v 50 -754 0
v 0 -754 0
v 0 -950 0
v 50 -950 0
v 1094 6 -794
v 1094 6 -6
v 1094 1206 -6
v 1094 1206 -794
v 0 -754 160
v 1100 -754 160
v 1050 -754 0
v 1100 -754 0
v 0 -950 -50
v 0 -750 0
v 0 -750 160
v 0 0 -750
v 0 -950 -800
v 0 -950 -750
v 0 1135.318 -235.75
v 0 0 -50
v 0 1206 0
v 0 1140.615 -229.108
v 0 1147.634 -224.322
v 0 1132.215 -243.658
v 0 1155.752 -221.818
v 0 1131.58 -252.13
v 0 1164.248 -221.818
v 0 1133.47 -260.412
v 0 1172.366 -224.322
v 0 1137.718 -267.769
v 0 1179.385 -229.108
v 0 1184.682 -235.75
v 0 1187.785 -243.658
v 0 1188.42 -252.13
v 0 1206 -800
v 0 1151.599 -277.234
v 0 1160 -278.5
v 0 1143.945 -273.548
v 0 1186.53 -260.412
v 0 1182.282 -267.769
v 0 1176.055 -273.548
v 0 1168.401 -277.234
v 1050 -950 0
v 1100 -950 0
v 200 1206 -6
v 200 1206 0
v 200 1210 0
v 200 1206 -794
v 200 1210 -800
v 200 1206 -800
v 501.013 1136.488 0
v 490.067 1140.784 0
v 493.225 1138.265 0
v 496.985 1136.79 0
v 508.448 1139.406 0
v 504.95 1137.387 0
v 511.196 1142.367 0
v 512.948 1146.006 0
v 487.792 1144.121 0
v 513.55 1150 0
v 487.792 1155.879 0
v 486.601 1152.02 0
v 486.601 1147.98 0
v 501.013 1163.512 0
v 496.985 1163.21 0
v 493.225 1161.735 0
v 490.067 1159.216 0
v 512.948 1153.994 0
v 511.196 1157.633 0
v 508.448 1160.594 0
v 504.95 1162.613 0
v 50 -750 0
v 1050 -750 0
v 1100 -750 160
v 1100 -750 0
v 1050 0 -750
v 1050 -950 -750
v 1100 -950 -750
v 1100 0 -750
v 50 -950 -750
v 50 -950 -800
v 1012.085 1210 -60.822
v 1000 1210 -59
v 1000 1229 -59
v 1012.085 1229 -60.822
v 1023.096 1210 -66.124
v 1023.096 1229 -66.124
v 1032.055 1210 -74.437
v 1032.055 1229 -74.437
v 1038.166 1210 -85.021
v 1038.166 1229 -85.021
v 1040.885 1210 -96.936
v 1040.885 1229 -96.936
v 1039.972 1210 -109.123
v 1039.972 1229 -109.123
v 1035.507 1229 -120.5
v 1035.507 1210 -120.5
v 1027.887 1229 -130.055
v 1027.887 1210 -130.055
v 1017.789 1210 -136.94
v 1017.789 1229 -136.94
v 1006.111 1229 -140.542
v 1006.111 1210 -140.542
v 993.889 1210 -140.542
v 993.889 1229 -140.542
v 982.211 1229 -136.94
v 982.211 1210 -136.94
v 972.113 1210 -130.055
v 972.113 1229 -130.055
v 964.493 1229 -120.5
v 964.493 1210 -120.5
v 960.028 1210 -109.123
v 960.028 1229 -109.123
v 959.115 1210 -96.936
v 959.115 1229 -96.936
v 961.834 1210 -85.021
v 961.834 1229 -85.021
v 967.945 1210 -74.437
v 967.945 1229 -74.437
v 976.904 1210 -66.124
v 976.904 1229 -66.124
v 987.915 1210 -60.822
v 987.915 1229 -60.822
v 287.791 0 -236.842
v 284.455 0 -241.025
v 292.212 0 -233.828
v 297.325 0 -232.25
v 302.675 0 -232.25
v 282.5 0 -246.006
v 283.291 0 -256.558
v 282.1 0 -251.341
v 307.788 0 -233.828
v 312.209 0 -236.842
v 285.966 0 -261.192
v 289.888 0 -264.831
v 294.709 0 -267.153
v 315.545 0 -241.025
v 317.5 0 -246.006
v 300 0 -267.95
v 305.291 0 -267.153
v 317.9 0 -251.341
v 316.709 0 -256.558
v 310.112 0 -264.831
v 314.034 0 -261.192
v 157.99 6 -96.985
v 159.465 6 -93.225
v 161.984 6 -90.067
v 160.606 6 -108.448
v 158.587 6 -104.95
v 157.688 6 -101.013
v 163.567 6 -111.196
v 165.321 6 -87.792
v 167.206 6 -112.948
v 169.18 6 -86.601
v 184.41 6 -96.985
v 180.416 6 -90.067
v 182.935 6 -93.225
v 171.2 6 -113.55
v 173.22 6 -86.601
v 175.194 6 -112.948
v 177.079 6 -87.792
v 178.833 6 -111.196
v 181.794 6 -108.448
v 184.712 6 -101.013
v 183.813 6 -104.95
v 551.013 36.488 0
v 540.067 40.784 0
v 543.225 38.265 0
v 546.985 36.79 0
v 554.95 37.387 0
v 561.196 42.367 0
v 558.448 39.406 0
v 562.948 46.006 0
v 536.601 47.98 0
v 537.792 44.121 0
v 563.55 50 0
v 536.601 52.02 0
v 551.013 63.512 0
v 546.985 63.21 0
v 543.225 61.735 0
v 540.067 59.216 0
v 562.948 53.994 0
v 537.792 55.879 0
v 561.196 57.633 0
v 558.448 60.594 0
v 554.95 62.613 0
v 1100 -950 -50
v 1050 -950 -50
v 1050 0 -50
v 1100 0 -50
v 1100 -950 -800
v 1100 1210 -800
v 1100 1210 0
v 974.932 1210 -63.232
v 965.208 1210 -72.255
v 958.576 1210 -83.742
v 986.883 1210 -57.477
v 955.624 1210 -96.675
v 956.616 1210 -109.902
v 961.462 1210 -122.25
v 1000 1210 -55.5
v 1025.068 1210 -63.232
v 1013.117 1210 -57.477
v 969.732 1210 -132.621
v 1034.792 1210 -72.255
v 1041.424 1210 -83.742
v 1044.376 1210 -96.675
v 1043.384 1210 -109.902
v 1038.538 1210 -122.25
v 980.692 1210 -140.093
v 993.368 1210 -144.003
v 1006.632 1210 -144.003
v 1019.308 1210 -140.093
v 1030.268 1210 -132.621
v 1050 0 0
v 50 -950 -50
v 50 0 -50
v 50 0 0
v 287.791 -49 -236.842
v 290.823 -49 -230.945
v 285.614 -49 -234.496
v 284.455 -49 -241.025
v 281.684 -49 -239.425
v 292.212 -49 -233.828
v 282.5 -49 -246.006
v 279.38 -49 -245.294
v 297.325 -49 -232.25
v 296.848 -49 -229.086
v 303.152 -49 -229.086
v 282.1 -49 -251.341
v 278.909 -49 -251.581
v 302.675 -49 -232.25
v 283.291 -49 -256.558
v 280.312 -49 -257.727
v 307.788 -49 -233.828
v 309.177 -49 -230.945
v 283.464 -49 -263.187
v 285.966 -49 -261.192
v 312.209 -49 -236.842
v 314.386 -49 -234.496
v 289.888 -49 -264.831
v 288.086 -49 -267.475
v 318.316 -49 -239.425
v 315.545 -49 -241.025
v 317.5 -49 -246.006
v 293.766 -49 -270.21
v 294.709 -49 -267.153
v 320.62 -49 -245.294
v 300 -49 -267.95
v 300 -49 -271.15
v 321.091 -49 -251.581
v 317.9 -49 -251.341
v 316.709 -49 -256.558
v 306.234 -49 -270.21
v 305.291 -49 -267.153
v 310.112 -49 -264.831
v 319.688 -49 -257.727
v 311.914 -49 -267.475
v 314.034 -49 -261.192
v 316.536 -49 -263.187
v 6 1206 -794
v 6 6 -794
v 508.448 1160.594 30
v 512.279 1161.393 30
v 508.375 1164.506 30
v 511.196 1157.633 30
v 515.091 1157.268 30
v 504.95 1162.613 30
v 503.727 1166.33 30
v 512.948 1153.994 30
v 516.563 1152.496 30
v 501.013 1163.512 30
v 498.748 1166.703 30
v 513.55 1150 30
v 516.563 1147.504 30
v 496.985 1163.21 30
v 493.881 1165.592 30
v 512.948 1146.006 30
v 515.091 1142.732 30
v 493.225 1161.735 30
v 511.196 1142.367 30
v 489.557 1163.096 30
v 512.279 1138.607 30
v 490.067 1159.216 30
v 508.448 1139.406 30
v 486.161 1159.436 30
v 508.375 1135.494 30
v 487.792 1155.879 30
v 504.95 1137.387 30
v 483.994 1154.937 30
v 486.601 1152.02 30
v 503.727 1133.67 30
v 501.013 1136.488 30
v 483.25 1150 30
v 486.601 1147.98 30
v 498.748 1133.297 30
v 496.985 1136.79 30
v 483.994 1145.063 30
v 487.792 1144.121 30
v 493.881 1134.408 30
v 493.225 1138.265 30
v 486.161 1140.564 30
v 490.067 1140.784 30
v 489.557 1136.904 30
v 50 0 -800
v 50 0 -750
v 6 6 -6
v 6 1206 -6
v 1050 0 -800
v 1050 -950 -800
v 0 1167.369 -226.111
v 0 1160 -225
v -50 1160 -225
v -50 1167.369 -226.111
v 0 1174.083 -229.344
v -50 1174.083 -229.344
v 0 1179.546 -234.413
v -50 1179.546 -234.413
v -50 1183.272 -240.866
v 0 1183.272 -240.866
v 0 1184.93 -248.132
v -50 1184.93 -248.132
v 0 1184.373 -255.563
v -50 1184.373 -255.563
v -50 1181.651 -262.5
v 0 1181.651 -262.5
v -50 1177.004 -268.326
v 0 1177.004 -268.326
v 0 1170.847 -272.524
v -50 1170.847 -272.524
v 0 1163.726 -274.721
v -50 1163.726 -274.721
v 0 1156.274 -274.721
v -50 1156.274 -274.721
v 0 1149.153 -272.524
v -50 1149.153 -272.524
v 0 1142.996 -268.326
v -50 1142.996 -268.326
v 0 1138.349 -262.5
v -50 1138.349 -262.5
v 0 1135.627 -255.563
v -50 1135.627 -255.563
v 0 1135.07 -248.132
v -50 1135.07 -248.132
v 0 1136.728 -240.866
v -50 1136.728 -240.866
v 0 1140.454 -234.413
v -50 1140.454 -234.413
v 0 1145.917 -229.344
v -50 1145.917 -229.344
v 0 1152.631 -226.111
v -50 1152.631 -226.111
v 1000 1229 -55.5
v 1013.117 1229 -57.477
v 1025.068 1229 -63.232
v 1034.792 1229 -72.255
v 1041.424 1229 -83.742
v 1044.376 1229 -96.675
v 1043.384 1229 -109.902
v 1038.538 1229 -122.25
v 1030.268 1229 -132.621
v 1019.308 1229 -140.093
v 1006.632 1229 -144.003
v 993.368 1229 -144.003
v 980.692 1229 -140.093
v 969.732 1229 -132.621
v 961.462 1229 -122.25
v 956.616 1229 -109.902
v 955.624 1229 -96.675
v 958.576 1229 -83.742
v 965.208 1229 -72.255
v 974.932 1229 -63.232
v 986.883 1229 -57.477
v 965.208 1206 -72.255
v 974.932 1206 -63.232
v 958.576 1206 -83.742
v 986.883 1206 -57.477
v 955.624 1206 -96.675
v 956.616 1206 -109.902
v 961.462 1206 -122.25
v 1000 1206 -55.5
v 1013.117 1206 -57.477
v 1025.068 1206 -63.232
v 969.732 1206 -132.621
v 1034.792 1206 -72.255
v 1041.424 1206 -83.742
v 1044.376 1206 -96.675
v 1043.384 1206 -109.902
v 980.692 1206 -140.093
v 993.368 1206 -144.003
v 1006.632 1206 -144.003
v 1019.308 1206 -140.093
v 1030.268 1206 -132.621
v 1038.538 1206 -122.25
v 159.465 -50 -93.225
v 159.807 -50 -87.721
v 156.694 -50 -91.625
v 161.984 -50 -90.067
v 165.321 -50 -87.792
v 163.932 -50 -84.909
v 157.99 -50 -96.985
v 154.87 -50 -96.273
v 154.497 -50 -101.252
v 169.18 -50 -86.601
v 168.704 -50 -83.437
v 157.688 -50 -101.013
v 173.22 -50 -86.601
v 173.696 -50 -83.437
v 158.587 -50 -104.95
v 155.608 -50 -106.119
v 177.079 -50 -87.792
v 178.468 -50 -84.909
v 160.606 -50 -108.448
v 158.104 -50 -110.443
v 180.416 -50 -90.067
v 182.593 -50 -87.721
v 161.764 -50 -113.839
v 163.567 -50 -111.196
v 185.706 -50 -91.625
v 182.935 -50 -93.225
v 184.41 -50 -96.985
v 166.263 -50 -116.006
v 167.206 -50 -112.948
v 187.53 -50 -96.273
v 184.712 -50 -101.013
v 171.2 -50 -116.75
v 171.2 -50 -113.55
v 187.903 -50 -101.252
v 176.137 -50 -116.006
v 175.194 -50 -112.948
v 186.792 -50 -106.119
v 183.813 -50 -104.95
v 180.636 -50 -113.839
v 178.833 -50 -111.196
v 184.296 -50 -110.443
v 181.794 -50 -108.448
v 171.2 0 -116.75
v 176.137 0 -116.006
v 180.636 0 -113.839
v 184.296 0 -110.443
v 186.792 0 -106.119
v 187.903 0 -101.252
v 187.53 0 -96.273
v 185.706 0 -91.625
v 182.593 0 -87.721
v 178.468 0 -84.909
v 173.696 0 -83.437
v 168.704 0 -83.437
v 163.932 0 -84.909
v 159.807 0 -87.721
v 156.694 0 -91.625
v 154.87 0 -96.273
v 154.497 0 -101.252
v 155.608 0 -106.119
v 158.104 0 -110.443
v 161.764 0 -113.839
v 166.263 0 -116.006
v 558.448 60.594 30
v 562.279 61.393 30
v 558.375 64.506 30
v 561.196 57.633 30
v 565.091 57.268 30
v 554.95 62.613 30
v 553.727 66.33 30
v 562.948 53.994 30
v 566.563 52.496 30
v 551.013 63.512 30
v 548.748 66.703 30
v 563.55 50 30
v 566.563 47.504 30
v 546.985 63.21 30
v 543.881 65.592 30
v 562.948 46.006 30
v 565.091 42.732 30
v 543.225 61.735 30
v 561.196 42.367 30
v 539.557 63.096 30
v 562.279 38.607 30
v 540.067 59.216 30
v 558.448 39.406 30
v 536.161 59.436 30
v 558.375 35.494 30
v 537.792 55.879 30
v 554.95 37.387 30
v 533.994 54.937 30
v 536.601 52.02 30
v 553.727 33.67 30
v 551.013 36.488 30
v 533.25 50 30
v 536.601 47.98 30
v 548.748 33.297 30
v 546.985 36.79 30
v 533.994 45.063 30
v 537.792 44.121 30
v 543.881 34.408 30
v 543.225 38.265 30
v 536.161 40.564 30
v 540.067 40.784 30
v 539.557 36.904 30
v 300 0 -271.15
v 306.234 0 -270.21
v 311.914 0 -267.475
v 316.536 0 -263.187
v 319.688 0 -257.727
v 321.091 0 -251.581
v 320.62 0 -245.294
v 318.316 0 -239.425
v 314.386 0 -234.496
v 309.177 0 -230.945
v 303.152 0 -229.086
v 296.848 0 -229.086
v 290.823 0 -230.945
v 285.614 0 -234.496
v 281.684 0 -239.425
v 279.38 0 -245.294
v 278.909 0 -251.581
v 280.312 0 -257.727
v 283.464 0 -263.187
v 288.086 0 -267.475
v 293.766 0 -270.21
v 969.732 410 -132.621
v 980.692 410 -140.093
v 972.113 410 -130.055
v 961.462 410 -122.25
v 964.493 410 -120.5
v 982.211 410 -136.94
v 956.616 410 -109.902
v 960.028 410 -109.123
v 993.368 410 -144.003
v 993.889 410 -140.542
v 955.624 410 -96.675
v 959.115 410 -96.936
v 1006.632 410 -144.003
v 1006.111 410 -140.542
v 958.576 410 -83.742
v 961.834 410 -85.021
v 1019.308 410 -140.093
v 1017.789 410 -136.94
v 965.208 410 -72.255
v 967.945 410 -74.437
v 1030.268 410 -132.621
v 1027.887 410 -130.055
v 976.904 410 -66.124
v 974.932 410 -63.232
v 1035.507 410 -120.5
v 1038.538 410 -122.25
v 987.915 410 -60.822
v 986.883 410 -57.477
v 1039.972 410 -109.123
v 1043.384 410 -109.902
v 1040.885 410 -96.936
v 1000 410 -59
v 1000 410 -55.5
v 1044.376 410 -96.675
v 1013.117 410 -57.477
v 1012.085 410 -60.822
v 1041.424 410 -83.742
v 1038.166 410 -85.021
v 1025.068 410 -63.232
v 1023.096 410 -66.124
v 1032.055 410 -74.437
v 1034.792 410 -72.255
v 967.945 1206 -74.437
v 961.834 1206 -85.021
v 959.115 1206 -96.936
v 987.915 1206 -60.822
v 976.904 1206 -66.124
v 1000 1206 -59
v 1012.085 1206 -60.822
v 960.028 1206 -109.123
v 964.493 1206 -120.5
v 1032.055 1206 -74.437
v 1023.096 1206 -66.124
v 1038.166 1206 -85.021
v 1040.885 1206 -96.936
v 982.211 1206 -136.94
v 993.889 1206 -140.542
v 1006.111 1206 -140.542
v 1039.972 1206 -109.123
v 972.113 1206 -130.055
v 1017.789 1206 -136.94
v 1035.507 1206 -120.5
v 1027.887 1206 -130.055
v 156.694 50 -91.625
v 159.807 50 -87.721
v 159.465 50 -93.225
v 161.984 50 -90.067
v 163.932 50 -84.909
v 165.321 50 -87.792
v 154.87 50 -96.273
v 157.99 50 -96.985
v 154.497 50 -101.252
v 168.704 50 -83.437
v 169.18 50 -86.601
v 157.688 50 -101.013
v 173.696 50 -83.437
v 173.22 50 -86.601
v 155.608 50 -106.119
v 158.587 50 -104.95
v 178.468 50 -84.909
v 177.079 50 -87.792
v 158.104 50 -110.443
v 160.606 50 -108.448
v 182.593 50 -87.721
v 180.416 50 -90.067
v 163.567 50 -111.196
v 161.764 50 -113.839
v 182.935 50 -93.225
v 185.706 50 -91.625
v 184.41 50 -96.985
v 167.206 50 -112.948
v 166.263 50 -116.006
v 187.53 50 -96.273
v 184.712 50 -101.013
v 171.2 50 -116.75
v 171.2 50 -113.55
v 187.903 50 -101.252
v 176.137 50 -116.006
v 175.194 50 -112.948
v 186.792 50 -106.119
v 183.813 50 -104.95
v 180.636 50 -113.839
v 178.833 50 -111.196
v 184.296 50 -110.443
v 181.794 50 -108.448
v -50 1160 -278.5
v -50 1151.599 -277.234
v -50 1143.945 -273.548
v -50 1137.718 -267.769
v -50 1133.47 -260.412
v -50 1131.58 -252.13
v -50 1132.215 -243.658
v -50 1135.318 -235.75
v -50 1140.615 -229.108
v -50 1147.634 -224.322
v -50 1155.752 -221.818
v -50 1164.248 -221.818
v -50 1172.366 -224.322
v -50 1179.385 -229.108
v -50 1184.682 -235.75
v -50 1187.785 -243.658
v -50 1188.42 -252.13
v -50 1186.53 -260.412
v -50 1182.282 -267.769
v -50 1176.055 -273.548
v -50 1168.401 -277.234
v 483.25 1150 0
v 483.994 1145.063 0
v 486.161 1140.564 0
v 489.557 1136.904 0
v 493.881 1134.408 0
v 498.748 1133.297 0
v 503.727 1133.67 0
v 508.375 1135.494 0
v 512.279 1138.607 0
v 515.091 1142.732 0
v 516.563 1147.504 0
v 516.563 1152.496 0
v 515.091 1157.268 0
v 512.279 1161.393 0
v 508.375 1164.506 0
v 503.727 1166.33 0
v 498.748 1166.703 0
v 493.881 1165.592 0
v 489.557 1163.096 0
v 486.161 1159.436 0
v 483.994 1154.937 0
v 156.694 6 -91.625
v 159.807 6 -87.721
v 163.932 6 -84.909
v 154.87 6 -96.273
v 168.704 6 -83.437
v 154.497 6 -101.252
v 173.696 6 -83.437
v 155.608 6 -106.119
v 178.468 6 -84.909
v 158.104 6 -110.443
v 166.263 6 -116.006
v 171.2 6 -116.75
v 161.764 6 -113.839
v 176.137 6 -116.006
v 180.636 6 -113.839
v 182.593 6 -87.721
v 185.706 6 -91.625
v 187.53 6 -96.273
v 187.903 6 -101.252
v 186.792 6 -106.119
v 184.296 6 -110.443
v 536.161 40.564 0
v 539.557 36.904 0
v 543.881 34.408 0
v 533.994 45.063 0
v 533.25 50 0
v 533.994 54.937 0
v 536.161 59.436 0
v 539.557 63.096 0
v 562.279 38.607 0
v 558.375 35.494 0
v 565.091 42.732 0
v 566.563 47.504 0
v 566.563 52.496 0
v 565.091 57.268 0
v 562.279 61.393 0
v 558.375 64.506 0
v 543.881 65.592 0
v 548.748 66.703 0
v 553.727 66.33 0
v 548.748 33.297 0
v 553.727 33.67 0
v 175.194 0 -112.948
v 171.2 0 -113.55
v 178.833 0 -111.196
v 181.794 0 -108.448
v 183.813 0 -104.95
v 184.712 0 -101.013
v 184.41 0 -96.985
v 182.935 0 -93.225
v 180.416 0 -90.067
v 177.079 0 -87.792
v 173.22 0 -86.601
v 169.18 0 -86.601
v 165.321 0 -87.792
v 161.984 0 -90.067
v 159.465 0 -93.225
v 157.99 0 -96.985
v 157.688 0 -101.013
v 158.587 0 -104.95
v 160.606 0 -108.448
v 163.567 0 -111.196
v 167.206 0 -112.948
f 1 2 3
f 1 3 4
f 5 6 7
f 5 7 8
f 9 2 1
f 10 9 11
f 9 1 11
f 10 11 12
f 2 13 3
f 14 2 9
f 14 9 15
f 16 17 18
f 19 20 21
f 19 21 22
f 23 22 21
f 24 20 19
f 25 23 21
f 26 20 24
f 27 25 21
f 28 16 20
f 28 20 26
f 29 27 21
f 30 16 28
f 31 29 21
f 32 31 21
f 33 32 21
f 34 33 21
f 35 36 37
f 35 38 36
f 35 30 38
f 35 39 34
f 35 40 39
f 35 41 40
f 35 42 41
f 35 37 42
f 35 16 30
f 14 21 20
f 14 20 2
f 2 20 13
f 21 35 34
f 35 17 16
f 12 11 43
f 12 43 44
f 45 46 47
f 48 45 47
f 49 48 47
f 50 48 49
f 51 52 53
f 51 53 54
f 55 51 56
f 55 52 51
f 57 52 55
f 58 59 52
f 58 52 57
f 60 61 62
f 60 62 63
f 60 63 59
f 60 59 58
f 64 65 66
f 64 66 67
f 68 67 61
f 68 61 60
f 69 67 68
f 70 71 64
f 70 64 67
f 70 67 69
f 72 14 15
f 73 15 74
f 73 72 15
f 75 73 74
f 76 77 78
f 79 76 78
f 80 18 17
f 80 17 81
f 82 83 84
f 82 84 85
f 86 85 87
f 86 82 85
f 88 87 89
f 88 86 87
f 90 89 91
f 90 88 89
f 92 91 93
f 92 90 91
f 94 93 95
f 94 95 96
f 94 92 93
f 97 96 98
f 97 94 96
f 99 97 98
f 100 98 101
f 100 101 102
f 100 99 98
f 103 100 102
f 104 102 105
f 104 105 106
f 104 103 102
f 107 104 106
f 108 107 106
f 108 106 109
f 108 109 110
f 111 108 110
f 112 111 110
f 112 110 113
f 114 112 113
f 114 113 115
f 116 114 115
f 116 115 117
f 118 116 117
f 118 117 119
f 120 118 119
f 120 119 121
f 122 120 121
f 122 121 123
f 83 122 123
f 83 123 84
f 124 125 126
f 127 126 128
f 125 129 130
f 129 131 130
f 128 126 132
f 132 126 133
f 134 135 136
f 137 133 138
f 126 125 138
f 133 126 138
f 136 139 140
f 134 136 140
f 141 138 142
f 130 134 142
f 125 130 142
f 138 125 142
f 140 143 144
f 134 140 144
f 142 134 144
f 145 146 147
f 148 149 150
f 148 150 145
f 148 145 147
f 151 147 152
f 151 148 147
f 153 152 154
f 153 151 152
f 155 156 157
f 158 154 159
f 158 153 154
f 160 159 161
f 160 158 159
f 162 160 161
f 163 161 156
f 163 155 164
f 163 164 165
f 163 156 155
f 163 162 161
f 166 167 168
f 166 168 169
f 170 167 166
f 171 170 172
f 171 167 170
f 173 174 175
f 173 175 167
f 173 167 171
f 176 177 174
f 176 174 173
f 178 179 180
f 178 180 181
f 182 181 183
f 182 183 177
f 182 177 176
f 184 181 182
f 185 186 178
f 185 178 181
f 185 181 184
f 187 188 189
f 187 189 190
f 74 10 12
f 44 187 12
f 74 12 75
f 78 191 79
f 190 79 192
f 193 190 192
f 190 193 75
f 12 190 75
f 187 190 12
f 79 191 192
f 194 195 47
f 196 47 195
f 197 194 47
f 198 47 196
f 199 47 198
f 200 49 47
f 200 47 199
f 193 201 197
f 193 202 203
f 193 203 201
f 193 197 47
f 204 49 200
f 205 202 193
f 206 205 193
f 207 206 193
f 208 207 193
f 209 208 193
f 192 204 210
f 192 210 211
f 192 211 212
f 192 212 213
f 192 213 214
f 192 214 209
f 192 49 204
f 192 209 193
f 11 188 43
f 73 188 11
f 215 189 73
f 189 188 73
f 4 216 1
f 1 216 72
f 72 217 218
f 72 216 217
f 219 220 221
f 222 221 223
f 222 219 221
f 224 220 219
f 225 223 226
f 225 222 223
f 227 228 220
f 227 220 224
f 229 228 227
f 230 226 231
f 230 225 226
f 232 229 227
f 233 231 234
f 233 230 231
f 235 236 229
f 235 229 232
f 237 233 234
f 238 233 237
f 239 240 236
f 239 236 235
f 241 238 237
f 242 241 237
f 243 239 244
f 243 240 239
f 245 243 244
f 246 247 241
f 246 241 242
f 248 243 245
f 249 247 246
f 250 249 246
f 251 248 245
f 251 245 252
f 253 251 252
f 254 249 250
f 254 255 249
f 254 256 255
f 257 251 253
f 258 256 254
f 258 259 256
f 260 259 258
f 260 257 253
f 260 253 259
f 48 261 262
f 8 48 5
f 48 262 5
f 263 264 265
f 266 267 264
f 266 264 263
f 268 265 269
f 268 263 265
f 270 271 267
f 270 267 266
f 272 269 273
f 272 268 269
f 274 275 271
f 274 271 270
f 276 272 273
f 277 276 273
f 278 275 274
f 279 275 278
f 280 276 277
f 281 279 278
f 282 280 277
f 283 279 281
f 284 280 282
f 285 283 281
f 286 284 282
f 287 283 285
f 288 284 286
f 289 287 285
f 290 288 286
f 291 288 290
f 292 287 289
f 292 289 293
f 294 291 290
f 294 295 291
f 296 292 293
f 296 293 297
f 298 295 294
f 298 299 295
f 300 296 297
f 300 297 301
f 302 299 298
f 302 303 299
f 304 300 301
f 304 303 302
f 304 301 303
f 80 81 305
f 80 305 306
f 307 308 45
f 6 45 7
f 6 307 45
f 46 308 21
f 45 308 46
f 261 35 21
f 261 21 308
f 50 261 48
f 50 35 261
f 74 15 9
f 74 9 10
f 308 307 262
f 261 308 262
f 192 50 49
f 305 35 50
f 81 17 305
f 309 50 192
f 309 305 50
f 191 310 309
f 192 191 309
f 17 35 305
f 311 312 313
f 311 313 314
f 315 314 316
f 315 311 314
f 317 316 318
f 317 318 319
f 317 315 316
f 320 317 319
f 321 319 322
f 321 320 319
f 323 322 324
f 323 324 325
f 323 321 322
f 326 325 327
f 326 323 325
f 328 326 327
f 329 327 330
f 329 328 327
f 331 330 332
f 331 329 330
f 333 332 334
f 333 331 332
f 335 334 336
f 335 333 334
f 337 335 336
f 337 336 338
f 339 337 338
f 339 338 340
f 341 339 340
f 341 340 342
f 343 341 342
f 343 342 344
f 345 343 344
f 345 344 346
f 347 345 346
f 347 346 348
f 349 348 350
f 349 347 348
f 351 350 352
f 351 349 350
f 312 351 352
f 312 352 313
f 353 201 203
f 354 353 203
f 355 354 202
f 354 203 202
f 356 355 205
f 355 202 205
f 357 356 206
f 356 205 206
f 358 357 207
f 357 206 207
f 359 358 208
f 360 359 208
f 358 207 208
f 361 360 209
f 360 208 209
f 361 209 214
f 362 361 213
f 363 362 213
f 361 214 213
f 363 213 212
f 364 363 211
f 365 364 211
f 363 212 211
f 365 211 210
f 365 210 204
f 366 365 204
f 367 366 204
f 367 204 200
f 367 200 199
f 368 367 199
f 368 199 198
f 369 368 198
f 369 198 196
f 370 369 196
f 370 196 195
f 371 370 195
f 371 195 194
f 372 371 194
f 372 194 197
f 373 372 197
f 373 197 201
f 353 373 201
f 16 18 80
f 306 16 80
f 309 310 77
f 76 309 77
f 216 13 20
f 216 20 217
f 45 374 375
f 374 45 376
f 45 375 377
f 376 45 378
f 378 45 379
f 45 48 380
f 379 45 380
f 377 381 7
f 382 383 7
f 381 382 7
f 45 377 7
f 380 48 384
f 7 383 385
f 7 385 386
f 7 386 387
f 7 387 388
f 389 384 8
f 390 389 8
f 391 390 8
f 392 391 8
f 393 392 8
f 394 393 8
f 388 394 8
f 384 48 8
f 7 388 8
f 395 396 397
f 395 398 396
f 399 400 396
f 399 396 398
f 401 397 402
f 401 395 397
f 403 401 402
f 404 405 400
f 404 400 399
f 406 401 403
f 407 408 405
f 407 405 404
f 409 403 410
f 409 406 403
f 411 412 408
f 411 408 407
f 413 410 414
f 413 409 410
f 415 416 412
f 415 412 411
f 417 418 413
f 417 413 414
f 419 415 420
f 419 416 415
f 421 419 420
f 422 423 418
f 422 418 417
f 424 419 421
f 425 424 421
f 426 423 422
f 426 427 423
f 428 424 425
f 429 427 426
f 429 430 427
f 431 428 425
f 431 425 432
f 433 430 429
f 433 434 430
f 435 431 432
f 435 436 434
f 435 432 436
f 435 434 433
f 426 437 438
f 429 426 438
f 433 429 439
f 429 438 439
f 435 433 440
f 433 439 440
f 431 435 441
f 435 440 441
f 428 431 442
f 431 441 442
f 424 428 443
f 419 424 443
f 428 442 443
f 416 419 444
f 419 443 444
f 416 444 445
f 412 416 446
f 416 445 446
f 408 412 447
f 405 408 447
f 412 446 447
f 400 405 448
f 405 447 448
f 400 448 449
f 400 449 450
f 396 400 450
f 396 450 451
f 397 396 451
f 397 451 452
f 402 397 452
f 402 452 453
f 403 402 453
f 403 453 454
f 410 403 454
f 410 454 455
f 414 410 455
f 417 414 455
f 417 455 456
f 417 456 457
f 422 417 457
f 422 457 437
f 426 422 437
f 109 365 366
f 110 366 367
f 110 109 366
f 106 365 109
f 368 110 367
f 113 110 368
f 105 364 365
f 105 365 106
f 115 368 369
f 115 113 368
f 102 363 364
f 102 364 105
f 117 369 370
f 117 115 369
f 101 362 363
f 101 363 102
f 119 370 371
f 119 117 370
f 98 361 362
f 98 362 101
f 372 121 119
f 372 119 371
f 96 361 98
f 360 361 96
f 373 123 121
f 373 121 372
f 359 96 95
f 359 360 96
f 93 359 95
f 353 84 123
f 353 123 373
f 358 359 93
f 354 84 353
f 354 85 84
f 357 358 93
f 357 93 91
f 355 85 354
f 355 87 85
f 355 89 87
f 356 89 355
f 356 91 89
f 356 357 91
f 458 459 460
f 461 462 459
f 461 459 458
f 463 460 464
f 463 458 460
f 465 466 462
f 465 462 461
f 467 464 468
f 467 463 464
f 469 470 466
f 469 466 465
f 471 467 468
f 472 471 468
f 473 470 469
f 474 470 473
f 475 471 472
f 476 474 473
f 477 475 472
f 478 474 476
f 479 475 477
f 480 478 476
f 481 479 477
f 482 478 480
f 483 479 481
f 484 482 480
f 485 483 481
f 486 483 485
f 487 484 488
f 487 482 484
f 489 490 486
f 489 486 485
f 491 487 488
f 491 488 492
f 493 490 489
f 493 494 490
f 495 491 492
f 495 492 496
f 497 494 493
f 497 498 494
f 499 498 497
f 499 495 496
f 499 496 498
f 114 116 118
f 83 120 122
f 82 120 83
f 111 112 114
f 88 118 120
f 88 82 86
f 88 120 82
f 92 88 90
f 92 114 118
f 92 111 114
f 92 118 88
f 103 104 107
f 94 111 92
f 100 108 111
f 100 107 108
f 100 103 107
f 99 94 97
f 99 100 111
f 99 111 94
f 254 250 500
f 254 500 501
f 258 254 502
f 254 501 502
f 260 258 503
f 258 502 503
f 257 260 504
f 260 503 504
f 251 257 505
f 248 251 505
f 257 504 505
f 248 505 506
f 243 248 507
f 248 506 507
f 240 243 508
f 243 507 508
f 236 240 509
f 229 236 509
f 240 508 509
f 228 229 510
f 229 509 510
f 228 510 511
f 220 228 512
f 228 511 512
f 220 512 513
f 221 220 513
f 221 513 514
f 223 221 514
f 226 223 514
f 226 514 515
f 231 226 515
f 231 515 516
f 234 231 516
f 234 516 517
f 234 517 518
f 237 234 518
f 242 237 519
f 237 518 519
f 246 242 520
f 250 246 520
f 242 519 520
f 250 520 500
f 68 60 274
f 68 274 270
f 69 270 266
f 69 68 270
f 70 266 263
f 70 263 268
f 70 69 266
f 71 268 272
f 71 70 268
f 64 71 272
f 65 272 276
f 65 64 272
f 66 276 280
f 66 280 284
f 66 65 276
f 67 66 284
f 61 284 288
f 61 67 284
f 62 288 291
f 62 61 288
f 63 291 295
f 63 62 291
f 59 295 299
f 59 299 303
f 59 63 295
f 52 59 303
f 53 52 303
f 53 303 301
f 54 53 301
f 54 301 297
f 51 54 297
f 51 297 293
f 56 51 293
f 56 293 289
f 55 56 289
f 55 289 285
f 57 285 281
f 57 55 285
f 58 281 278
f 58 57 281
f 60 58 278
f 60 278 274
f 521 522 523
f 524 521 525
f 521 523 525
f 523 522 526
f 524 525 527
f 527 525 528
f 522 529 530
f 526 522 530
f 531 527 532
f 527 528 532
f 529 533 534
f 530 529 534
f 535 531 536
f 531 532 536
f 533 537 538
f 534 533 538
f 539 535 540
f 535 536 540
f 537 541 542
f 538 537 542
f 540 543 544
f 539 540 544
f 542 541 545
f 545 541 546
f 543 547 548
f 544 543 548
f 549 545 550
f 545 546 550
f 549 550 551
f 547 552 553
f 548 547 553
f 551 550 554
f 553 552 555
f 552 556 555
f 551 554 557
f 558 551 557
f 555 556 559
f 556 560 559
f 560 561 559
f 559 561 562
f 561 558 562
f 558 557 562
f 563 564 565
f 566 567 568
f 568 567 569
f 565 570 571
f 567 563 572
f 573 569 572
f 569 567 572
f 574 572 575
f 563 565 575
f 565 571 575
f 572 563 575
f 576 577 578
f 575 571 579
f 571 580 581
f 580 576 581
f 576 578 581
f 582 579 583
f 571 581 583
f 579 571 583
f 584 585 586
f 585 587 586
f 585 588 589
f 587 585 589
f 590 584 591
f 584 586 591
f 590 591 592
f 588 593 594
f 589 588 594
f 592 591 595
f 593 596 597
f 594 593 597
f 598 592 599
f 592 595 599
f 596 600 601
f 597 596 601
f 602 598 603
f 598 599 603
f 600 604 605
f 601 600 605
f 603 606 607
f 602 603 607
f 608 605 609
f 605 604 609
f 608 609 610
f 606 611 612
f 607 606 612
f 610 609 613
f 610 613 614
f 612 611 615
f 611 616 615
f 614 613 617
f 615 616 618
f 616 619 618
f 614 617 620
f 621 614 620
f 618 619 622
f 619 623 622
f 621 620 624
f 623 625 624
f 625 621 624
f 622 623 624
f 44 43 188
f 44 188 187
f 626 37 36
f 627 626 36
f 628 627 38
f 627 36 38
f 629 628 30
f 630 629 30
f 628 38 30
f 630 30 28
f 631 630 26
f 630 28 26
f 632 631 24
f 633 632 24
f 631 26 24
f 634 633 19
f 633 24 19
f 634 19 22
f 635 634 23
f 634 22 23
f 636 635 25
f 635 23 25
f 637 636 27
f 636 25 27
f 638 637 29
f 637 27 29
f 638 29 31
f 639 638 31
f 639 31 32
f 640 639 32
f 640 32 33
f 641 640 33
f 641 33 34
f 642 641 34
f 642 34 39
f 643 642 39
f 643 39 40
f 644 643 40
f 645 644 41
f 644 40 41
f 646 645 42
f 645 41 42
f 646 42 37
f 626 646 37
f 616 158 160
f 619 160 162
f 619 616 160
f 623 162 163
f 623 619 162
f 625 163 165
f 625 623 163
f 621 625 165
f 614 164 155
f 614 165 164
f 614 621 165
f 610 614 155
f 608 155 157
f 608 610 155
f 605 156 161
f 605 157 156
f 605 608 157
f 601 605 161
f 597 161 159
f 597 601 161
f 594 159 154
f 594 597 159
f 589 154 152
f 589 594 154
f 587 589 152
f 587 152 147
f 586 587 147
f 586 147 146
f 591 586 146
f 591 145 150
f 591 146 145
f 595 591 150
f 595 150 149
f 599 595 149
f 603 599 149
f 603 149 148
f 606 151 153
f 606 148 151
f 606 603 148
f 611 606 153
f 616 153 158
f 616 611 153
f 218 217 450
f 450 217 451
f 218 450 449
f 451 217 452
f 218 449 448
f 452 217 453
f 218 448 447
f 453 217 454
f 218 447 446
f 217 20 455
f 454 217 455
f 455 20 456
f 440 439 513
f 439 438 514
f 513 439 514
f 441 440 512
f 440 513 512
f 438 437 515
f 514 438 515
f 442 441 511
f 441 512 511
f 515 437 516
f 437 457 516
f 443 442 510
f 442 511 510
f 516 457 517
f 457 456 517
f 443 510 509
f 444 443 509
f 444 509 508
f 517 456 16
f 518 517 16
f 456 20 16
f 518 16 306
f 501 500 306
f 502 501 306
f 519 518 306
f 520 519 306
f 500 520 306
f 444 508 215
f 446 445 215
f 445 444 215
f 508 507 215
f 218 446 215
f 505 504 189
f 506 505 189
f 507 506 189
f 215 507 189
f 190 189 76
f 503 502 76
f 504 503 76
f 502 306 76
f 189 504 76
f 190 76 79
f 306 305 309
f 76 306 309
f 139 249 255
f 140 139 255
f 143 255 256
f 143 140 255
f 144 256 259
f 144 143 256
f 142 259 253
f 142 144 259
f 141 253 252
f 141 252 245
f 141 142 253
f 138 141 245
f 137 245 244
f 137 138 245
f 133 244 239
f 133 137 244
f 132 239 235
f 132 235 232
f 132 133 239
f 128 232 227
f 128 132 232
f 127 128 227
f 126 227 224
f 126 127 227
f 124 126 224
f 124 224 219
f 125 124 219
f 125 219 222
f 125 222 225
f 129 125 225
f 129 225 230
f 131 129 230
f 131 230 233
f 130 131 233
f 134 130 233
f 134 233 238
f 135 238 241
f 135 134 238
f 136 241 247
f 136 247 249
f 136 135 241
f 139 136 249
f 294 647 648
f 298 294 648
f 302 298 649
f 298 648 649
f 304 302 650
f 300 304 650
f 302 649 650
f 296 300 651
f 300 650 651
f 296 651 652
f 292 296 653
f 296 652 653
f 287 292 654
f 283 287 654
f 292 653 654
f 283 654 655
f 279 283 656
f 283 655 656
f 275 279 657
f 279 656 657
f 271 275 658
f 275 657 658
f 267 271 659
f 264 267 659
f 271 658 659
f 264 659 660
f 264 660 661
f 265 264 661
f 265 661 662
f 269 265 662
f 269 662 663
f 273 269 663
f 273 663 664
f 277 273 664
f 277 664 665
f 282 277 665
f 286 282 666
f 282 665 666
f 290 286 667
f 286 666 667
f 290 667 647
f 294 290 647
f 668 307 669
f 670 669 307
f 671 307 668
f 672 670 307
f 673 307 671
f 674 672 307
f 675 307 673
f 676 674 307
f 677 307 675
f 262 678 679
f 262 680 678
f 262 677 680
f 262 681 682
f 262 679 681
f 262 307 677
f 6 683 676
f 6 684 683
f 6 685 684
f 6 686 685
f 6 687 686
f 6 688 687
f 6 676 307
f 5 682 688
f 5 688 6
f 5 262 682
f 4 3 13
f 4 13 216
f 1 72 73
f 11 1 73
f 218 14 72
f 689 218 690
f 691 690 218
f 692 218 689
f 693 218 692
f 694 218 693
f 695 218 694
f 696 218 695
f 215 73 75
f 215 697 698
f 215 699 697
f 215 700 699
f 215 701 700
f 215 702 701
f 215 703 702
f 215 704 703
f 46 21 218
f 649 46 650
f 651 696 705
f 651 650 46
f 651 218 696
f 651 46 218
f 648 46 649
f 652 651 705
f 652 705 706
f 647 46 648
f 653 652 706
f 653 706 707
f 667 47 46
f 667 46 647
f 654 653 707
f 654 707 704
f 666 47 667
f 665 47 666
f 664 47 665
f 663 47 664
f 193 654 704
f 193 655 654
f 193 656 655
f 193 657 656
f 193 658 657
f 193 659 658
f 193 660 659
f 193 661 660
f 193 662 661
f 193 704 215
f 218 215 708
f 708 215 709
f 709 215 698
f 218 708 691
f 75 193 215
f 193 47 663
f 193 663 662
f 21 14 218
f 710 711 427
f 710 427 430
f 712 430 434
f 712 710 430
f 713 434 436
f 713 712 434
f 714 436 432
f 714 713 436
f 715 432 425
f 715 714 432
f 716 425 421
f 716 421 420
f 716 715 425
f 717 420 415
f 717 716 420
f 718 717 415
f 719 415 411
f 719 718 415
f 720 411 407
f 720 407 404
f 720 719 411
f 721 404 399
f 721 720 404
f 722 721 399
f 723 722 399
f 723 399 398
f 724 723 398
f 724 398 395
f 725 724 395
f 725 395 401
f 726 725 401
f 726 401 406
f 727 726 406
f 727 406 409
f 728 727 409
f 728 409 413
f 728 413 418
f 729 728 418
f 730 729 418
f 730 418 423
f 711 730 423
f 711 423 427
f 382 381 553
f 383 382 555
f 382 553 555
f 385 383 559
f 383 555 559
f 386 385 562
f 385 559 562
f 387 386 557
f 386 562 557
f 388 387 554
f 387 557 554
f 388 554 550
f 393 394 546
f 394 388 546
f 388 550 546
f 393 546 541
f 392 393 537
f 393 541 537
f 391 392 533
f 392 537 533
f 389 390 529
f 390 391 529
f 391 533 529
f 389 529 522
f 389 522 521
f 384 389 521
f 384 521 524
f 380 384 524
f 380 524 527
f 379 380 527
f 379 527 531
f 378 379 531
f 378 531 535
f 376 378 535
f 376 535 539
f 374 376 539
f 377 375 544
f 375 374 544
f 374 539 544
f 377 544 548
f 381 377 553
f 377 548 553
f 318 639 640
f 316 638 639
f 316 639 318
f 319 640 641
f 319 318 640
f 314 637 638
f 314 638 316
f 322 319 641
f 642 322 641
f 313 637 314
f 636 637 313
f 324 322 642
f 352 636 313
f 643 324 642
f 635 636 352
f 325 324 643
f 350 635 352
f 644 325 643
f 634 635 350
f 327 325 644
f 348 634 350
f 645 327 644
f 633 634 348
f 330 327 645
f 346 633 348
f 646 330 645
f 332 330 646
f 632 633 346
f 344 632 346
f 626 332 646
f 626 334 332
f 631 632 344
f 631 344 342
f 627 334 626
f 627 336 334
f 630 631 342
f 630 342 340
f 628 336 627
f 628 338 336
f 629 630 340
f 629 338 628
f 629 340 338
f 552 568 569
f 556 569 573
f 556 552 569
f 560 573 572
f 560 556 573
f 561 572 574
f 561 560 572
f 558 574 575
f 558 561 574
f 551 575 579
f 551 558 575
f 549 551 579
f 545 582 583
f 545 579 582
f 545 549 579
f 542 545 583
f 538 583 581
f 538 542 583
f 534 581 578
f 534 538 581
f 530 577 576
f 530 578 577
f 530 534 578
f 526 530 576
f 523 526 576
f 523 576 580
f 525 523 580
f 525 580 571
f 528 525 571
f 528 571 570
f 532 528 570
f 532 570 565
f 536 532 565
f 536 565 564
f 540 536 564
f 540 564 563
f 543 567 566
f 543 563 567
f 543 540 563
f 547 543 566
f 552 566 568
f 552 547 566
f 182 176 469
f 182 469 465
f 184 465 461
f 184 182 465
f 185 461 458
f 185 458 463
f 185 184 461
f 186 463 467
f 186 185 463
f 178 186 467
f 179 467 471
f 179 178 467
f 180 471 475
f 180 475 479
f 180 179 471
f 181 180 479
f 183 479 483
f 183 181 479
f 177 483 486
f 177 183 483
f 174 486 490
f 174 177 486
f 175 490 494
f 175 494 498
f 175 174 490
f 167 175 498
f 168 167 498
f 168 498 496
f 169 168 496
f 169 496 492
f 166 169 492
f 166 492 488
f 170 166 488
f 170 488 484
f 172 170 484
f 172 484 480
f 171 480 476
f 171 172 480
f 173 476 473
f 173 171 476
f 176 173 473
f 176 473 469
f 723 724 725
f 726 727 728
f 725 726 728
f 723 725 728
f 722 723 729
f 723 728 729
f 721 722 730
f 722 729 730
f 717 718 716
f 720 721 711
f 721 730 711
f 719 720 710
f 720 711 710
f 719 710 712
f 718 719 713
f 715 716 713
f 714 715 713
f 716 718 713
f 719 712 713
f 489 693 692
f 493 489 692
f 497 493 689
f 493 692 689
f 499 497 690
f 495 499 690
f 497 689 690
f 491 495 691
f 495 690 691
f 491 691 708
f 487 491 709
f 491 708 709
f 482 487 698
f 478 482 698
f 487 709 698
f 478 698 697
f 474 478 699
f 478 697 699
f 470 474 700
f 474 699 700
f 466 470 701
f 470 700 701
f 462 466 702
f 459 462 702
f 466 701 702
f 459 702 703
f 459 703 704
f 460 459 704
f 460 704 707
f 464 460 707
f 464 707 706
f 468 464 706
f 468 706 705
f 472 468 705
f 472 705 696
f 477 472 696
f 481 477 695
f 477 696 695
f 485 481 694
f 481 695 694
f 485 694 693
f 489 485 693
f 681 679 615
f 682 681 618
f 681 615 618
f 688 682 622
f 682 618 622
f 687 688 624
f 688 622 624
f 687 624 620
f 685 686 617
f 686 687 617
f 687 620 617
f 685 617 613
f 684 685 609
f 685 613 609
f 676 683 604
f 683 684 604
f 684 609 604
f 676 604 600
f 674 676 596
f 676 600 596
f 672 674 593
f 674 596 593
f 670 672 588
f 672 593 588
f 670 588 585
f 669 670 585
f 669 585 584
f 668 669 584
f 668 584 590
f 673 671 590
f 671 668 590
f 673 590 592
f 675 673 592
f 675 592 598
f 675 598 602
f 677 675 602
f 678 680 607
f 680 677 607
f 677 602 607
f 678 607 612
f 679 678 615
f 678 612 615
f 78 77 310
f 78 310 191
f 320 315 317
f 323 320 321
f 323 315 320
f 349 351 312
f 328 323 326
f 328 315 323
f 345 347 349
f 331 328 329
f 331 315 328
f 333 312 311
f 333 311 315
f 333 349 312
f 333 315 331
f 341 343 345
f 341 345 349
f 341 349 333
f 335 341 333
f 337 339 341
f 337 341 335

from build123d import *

# Parameters (mm, degrees)
SKETCH_1_W           = 1100
SKETCH_1_H           = 800
EXTRUDE_1_DEPTH      = 6
SKETCH_3_W           = 1100
SKETCH_3_H           = 800
SKETCH_3_W_2         = 1088
SKETCH_3_H_2         = 788
EXTRUDE_2_DEPTH      = 1200
SKETCH_4_W           = 900
SKETCH_4_H           = 800
EXTRUDE_3_DEPTH      = 4
SKETCH_5_W           = 50
SKETCH_5_H           = 50
EXTRUDE_4_DEPTH      = 950
EXTRUDE_5_DEPTH      = 19
EXTRUDE_5_DEPTH_BACK = 800
SKETCH_6_R           = 44.5
SKETCH_6_R_2         = 41
SKETCH_7_R           = 28.5
SKETCH_7_R_2         = 25
EXTRUDE_6_DEPTH      = 50
EXTRUDE_7_DEPTH      = 50
EXTRUDE_7_DEPTH_BACK = 50
SKETCH_8_R           = 16.75
SKETCH_8_R_2         = 13.55
SKETCH_9_R           = 21.15
SKETCH_9_R_2         = 17.95
EXTRUDE_8_DEPTH      = 49
SKETCH_10_R          = 16.75
SKETCH_10_R_2        = 13.55
EXTRUDE_9_DEPTH      = 30
SKETCH_13_W          = 1100
SKETCH_13_H          = 4
EXTRUDE_12_DEPTH     = 160
SKETCH_14_R          = 16.75
SKETCH_14_R_2        = 13.55
EXTRUDE_13_DEPTH     = 30


with BuildPart() as part:
    # Эскиз1 → Бобышка-Вытянуть1 (new body)
    with BuildSketch(Plane(origin=(0, 0, 0), x_dir=(1, 0, 0), z_dir=(0, 1, 0))):
        with Locations((550, 400)):
            Rectangle(SKETCH_1_W, SKETCH_1_H)
    extrude(amount=EXTRUDE_1_DEPTH)

    # Эскиз3 → Бобышка-Вытянуть2 (add)
    with BuildSketch(Plane(origin=(0, 6, 0), x_dir=(1, 0, 0), z_dir=(0, 1, 0))):
        with Locations((550, 400)):
            Rectangle(SKETCH_3_W, SKETCH_3_H)
        with Locations((550, 400)):
            Rectangle(SKETCH_3_W_2, SKETCH_3_H_2, mode=Mode.SUBTRACT)
    extrude(amount=EXTRUDE_2_DEPTH)

    # Эскиз4 → Бобышка-Вытянуть3 (add)
    with BuildSketch(Plane(origin=(0, 1206, 0), x_dir=(1, 0, 0), z_dir=(0, 1, 0))):
        with Locations((650, 400)):
            Rectangle(SKETCH_4_W, SKETCH_4_H)
    extrude(amount=EXTRUDE_3_DEPTH)

    # Эскиз5 → Бобышка-Вытянуть4 (add)
    with BuildSketch(Plane.XZ):
        with Locations((1075, -25)):
            Rectangle(SKETCH_5_W, SKETCH_5_H)
        with Locations((25, -25)):
            Rectangle(SKETCH_5_W, SKETCH_5_H)
        with Locations((1075, -775)):
            Rectangle(SKETCH_5_W, SKETCH_5_H)
        with Locations((25, -775)):
            Rectangle(SKETCH_5_W, SKETCH_5_H)
    extrude(amount=EXTRUDE_4_DEPTH)

    # Эскиз6 → Бобышка-Вытянуть5 (add, two sides: drawn at the far end of the back side and taken through both)
    with BuildSketch(Plane(origin=(0, 1210, 0), x_dir=(1, 0, 0), z_dir=(0, 1, 0)).offset(-EXTRUDE_5_DEPTH_BACK)):
        with Locations(Location((1000, 100, 0), (0, 0, 270))):
            Circle(SKETCH_6_R)
        with Locations(Location((1000, 100, 0), (0, 0, 270))):
            Circle(SKETCH_6_R_2, mode=Mode.SUBTRACT)
    extrude(amount=EXTRUDE_5_DEPTH + EXTRUDE_5_DEPTH_BACK)

    # Эскиз7 → Бобышка-Вытянуть6 (add)
    with BuildSketch(Plane.ZY):
        with Locations(Location((-250, 1160, 0), (0, 0, 180))):
            Circle(SKETCH_7_R)
        with Locations((-250, 1160)):
            Circle(SKETCH_7_R_2, mode=Mode.SUBTRACT)
    extrude(amount=EXTRUDE_6_DEPTH)

    # Эскиз8 → Бобышка-Вытянуть7 (add, two sides: drawn at the far end of the back side and taken through both)
    with BuildSketch(Plane.XZ.offset(-EXTRUDE_7_DEPTH_BACK)):
        with Locations(Location((171.2, -100, 0), (0, 0, 270))):
            Circle(SKETCH_8_R)
        with Locations(Location((171.2, -100, 0), (0, 0, 270))):
            Circle(SKETCH_8_R_2, mode=Mode.SUBTRACT)
    extrude(amount=EXTRUDE_7_DEPTH + EXTRUDE_7_DEPTH_BACK)

    # Эскиз9 → Бобышка-Вытянуть8 (add)
    with BuildSketch(Plane.XZ):
        with Locations(Location((300, -250, 0), (0, 0, 270))):
            Circle(SKETCH_9_R)
        with Locations(Location((300, -250, 0), (0, 0, 270))):
            Circle(SKETCH_9_R_2, mode=Mode.SUBTRACT)
    extrude(amount=EXTRUDE_8_DEPTH)

    # Эскиз10 → Бобышка-Вытянуть9 (add)
    with BuildSketch(Plane.XY):
        with Locations(Location((500, 1150, 0), (0, 0, 180))):
            Circle(SKETCH_10_R)
        with Locations((500, 1150)):
            Circle(SKETCH_10_R_2, mode=Mode.SUBTRACT)
    extrude(amount=EXTRUDE_9_DEPTH)

    # Эскиз13 → Бобышка-Вытянуть12 (add)
    with BuildSketch(Plane.XY):
        with Locations((550, -752)):
            Rectangle(SKETCH_13_W, SKETCH_13_H)
    extrude(amount=EXTRUDE_12_DEPTH)

    # Эскиз14 → Бобышка-Вытянуть13 (add)
    with BuildSketch(Plane.XY):
        with Locations(Location((550, 50, 0), (0, 0, 180))):
            Circle(SKETCH_14_R)
        with Locations((550, 50)):
            Circle(SKETCH_14_R_2, mode=Mode.SUBTRACT)
    extrude(amount=EXTRUDE_13_DEPTH)


solid = part.part
